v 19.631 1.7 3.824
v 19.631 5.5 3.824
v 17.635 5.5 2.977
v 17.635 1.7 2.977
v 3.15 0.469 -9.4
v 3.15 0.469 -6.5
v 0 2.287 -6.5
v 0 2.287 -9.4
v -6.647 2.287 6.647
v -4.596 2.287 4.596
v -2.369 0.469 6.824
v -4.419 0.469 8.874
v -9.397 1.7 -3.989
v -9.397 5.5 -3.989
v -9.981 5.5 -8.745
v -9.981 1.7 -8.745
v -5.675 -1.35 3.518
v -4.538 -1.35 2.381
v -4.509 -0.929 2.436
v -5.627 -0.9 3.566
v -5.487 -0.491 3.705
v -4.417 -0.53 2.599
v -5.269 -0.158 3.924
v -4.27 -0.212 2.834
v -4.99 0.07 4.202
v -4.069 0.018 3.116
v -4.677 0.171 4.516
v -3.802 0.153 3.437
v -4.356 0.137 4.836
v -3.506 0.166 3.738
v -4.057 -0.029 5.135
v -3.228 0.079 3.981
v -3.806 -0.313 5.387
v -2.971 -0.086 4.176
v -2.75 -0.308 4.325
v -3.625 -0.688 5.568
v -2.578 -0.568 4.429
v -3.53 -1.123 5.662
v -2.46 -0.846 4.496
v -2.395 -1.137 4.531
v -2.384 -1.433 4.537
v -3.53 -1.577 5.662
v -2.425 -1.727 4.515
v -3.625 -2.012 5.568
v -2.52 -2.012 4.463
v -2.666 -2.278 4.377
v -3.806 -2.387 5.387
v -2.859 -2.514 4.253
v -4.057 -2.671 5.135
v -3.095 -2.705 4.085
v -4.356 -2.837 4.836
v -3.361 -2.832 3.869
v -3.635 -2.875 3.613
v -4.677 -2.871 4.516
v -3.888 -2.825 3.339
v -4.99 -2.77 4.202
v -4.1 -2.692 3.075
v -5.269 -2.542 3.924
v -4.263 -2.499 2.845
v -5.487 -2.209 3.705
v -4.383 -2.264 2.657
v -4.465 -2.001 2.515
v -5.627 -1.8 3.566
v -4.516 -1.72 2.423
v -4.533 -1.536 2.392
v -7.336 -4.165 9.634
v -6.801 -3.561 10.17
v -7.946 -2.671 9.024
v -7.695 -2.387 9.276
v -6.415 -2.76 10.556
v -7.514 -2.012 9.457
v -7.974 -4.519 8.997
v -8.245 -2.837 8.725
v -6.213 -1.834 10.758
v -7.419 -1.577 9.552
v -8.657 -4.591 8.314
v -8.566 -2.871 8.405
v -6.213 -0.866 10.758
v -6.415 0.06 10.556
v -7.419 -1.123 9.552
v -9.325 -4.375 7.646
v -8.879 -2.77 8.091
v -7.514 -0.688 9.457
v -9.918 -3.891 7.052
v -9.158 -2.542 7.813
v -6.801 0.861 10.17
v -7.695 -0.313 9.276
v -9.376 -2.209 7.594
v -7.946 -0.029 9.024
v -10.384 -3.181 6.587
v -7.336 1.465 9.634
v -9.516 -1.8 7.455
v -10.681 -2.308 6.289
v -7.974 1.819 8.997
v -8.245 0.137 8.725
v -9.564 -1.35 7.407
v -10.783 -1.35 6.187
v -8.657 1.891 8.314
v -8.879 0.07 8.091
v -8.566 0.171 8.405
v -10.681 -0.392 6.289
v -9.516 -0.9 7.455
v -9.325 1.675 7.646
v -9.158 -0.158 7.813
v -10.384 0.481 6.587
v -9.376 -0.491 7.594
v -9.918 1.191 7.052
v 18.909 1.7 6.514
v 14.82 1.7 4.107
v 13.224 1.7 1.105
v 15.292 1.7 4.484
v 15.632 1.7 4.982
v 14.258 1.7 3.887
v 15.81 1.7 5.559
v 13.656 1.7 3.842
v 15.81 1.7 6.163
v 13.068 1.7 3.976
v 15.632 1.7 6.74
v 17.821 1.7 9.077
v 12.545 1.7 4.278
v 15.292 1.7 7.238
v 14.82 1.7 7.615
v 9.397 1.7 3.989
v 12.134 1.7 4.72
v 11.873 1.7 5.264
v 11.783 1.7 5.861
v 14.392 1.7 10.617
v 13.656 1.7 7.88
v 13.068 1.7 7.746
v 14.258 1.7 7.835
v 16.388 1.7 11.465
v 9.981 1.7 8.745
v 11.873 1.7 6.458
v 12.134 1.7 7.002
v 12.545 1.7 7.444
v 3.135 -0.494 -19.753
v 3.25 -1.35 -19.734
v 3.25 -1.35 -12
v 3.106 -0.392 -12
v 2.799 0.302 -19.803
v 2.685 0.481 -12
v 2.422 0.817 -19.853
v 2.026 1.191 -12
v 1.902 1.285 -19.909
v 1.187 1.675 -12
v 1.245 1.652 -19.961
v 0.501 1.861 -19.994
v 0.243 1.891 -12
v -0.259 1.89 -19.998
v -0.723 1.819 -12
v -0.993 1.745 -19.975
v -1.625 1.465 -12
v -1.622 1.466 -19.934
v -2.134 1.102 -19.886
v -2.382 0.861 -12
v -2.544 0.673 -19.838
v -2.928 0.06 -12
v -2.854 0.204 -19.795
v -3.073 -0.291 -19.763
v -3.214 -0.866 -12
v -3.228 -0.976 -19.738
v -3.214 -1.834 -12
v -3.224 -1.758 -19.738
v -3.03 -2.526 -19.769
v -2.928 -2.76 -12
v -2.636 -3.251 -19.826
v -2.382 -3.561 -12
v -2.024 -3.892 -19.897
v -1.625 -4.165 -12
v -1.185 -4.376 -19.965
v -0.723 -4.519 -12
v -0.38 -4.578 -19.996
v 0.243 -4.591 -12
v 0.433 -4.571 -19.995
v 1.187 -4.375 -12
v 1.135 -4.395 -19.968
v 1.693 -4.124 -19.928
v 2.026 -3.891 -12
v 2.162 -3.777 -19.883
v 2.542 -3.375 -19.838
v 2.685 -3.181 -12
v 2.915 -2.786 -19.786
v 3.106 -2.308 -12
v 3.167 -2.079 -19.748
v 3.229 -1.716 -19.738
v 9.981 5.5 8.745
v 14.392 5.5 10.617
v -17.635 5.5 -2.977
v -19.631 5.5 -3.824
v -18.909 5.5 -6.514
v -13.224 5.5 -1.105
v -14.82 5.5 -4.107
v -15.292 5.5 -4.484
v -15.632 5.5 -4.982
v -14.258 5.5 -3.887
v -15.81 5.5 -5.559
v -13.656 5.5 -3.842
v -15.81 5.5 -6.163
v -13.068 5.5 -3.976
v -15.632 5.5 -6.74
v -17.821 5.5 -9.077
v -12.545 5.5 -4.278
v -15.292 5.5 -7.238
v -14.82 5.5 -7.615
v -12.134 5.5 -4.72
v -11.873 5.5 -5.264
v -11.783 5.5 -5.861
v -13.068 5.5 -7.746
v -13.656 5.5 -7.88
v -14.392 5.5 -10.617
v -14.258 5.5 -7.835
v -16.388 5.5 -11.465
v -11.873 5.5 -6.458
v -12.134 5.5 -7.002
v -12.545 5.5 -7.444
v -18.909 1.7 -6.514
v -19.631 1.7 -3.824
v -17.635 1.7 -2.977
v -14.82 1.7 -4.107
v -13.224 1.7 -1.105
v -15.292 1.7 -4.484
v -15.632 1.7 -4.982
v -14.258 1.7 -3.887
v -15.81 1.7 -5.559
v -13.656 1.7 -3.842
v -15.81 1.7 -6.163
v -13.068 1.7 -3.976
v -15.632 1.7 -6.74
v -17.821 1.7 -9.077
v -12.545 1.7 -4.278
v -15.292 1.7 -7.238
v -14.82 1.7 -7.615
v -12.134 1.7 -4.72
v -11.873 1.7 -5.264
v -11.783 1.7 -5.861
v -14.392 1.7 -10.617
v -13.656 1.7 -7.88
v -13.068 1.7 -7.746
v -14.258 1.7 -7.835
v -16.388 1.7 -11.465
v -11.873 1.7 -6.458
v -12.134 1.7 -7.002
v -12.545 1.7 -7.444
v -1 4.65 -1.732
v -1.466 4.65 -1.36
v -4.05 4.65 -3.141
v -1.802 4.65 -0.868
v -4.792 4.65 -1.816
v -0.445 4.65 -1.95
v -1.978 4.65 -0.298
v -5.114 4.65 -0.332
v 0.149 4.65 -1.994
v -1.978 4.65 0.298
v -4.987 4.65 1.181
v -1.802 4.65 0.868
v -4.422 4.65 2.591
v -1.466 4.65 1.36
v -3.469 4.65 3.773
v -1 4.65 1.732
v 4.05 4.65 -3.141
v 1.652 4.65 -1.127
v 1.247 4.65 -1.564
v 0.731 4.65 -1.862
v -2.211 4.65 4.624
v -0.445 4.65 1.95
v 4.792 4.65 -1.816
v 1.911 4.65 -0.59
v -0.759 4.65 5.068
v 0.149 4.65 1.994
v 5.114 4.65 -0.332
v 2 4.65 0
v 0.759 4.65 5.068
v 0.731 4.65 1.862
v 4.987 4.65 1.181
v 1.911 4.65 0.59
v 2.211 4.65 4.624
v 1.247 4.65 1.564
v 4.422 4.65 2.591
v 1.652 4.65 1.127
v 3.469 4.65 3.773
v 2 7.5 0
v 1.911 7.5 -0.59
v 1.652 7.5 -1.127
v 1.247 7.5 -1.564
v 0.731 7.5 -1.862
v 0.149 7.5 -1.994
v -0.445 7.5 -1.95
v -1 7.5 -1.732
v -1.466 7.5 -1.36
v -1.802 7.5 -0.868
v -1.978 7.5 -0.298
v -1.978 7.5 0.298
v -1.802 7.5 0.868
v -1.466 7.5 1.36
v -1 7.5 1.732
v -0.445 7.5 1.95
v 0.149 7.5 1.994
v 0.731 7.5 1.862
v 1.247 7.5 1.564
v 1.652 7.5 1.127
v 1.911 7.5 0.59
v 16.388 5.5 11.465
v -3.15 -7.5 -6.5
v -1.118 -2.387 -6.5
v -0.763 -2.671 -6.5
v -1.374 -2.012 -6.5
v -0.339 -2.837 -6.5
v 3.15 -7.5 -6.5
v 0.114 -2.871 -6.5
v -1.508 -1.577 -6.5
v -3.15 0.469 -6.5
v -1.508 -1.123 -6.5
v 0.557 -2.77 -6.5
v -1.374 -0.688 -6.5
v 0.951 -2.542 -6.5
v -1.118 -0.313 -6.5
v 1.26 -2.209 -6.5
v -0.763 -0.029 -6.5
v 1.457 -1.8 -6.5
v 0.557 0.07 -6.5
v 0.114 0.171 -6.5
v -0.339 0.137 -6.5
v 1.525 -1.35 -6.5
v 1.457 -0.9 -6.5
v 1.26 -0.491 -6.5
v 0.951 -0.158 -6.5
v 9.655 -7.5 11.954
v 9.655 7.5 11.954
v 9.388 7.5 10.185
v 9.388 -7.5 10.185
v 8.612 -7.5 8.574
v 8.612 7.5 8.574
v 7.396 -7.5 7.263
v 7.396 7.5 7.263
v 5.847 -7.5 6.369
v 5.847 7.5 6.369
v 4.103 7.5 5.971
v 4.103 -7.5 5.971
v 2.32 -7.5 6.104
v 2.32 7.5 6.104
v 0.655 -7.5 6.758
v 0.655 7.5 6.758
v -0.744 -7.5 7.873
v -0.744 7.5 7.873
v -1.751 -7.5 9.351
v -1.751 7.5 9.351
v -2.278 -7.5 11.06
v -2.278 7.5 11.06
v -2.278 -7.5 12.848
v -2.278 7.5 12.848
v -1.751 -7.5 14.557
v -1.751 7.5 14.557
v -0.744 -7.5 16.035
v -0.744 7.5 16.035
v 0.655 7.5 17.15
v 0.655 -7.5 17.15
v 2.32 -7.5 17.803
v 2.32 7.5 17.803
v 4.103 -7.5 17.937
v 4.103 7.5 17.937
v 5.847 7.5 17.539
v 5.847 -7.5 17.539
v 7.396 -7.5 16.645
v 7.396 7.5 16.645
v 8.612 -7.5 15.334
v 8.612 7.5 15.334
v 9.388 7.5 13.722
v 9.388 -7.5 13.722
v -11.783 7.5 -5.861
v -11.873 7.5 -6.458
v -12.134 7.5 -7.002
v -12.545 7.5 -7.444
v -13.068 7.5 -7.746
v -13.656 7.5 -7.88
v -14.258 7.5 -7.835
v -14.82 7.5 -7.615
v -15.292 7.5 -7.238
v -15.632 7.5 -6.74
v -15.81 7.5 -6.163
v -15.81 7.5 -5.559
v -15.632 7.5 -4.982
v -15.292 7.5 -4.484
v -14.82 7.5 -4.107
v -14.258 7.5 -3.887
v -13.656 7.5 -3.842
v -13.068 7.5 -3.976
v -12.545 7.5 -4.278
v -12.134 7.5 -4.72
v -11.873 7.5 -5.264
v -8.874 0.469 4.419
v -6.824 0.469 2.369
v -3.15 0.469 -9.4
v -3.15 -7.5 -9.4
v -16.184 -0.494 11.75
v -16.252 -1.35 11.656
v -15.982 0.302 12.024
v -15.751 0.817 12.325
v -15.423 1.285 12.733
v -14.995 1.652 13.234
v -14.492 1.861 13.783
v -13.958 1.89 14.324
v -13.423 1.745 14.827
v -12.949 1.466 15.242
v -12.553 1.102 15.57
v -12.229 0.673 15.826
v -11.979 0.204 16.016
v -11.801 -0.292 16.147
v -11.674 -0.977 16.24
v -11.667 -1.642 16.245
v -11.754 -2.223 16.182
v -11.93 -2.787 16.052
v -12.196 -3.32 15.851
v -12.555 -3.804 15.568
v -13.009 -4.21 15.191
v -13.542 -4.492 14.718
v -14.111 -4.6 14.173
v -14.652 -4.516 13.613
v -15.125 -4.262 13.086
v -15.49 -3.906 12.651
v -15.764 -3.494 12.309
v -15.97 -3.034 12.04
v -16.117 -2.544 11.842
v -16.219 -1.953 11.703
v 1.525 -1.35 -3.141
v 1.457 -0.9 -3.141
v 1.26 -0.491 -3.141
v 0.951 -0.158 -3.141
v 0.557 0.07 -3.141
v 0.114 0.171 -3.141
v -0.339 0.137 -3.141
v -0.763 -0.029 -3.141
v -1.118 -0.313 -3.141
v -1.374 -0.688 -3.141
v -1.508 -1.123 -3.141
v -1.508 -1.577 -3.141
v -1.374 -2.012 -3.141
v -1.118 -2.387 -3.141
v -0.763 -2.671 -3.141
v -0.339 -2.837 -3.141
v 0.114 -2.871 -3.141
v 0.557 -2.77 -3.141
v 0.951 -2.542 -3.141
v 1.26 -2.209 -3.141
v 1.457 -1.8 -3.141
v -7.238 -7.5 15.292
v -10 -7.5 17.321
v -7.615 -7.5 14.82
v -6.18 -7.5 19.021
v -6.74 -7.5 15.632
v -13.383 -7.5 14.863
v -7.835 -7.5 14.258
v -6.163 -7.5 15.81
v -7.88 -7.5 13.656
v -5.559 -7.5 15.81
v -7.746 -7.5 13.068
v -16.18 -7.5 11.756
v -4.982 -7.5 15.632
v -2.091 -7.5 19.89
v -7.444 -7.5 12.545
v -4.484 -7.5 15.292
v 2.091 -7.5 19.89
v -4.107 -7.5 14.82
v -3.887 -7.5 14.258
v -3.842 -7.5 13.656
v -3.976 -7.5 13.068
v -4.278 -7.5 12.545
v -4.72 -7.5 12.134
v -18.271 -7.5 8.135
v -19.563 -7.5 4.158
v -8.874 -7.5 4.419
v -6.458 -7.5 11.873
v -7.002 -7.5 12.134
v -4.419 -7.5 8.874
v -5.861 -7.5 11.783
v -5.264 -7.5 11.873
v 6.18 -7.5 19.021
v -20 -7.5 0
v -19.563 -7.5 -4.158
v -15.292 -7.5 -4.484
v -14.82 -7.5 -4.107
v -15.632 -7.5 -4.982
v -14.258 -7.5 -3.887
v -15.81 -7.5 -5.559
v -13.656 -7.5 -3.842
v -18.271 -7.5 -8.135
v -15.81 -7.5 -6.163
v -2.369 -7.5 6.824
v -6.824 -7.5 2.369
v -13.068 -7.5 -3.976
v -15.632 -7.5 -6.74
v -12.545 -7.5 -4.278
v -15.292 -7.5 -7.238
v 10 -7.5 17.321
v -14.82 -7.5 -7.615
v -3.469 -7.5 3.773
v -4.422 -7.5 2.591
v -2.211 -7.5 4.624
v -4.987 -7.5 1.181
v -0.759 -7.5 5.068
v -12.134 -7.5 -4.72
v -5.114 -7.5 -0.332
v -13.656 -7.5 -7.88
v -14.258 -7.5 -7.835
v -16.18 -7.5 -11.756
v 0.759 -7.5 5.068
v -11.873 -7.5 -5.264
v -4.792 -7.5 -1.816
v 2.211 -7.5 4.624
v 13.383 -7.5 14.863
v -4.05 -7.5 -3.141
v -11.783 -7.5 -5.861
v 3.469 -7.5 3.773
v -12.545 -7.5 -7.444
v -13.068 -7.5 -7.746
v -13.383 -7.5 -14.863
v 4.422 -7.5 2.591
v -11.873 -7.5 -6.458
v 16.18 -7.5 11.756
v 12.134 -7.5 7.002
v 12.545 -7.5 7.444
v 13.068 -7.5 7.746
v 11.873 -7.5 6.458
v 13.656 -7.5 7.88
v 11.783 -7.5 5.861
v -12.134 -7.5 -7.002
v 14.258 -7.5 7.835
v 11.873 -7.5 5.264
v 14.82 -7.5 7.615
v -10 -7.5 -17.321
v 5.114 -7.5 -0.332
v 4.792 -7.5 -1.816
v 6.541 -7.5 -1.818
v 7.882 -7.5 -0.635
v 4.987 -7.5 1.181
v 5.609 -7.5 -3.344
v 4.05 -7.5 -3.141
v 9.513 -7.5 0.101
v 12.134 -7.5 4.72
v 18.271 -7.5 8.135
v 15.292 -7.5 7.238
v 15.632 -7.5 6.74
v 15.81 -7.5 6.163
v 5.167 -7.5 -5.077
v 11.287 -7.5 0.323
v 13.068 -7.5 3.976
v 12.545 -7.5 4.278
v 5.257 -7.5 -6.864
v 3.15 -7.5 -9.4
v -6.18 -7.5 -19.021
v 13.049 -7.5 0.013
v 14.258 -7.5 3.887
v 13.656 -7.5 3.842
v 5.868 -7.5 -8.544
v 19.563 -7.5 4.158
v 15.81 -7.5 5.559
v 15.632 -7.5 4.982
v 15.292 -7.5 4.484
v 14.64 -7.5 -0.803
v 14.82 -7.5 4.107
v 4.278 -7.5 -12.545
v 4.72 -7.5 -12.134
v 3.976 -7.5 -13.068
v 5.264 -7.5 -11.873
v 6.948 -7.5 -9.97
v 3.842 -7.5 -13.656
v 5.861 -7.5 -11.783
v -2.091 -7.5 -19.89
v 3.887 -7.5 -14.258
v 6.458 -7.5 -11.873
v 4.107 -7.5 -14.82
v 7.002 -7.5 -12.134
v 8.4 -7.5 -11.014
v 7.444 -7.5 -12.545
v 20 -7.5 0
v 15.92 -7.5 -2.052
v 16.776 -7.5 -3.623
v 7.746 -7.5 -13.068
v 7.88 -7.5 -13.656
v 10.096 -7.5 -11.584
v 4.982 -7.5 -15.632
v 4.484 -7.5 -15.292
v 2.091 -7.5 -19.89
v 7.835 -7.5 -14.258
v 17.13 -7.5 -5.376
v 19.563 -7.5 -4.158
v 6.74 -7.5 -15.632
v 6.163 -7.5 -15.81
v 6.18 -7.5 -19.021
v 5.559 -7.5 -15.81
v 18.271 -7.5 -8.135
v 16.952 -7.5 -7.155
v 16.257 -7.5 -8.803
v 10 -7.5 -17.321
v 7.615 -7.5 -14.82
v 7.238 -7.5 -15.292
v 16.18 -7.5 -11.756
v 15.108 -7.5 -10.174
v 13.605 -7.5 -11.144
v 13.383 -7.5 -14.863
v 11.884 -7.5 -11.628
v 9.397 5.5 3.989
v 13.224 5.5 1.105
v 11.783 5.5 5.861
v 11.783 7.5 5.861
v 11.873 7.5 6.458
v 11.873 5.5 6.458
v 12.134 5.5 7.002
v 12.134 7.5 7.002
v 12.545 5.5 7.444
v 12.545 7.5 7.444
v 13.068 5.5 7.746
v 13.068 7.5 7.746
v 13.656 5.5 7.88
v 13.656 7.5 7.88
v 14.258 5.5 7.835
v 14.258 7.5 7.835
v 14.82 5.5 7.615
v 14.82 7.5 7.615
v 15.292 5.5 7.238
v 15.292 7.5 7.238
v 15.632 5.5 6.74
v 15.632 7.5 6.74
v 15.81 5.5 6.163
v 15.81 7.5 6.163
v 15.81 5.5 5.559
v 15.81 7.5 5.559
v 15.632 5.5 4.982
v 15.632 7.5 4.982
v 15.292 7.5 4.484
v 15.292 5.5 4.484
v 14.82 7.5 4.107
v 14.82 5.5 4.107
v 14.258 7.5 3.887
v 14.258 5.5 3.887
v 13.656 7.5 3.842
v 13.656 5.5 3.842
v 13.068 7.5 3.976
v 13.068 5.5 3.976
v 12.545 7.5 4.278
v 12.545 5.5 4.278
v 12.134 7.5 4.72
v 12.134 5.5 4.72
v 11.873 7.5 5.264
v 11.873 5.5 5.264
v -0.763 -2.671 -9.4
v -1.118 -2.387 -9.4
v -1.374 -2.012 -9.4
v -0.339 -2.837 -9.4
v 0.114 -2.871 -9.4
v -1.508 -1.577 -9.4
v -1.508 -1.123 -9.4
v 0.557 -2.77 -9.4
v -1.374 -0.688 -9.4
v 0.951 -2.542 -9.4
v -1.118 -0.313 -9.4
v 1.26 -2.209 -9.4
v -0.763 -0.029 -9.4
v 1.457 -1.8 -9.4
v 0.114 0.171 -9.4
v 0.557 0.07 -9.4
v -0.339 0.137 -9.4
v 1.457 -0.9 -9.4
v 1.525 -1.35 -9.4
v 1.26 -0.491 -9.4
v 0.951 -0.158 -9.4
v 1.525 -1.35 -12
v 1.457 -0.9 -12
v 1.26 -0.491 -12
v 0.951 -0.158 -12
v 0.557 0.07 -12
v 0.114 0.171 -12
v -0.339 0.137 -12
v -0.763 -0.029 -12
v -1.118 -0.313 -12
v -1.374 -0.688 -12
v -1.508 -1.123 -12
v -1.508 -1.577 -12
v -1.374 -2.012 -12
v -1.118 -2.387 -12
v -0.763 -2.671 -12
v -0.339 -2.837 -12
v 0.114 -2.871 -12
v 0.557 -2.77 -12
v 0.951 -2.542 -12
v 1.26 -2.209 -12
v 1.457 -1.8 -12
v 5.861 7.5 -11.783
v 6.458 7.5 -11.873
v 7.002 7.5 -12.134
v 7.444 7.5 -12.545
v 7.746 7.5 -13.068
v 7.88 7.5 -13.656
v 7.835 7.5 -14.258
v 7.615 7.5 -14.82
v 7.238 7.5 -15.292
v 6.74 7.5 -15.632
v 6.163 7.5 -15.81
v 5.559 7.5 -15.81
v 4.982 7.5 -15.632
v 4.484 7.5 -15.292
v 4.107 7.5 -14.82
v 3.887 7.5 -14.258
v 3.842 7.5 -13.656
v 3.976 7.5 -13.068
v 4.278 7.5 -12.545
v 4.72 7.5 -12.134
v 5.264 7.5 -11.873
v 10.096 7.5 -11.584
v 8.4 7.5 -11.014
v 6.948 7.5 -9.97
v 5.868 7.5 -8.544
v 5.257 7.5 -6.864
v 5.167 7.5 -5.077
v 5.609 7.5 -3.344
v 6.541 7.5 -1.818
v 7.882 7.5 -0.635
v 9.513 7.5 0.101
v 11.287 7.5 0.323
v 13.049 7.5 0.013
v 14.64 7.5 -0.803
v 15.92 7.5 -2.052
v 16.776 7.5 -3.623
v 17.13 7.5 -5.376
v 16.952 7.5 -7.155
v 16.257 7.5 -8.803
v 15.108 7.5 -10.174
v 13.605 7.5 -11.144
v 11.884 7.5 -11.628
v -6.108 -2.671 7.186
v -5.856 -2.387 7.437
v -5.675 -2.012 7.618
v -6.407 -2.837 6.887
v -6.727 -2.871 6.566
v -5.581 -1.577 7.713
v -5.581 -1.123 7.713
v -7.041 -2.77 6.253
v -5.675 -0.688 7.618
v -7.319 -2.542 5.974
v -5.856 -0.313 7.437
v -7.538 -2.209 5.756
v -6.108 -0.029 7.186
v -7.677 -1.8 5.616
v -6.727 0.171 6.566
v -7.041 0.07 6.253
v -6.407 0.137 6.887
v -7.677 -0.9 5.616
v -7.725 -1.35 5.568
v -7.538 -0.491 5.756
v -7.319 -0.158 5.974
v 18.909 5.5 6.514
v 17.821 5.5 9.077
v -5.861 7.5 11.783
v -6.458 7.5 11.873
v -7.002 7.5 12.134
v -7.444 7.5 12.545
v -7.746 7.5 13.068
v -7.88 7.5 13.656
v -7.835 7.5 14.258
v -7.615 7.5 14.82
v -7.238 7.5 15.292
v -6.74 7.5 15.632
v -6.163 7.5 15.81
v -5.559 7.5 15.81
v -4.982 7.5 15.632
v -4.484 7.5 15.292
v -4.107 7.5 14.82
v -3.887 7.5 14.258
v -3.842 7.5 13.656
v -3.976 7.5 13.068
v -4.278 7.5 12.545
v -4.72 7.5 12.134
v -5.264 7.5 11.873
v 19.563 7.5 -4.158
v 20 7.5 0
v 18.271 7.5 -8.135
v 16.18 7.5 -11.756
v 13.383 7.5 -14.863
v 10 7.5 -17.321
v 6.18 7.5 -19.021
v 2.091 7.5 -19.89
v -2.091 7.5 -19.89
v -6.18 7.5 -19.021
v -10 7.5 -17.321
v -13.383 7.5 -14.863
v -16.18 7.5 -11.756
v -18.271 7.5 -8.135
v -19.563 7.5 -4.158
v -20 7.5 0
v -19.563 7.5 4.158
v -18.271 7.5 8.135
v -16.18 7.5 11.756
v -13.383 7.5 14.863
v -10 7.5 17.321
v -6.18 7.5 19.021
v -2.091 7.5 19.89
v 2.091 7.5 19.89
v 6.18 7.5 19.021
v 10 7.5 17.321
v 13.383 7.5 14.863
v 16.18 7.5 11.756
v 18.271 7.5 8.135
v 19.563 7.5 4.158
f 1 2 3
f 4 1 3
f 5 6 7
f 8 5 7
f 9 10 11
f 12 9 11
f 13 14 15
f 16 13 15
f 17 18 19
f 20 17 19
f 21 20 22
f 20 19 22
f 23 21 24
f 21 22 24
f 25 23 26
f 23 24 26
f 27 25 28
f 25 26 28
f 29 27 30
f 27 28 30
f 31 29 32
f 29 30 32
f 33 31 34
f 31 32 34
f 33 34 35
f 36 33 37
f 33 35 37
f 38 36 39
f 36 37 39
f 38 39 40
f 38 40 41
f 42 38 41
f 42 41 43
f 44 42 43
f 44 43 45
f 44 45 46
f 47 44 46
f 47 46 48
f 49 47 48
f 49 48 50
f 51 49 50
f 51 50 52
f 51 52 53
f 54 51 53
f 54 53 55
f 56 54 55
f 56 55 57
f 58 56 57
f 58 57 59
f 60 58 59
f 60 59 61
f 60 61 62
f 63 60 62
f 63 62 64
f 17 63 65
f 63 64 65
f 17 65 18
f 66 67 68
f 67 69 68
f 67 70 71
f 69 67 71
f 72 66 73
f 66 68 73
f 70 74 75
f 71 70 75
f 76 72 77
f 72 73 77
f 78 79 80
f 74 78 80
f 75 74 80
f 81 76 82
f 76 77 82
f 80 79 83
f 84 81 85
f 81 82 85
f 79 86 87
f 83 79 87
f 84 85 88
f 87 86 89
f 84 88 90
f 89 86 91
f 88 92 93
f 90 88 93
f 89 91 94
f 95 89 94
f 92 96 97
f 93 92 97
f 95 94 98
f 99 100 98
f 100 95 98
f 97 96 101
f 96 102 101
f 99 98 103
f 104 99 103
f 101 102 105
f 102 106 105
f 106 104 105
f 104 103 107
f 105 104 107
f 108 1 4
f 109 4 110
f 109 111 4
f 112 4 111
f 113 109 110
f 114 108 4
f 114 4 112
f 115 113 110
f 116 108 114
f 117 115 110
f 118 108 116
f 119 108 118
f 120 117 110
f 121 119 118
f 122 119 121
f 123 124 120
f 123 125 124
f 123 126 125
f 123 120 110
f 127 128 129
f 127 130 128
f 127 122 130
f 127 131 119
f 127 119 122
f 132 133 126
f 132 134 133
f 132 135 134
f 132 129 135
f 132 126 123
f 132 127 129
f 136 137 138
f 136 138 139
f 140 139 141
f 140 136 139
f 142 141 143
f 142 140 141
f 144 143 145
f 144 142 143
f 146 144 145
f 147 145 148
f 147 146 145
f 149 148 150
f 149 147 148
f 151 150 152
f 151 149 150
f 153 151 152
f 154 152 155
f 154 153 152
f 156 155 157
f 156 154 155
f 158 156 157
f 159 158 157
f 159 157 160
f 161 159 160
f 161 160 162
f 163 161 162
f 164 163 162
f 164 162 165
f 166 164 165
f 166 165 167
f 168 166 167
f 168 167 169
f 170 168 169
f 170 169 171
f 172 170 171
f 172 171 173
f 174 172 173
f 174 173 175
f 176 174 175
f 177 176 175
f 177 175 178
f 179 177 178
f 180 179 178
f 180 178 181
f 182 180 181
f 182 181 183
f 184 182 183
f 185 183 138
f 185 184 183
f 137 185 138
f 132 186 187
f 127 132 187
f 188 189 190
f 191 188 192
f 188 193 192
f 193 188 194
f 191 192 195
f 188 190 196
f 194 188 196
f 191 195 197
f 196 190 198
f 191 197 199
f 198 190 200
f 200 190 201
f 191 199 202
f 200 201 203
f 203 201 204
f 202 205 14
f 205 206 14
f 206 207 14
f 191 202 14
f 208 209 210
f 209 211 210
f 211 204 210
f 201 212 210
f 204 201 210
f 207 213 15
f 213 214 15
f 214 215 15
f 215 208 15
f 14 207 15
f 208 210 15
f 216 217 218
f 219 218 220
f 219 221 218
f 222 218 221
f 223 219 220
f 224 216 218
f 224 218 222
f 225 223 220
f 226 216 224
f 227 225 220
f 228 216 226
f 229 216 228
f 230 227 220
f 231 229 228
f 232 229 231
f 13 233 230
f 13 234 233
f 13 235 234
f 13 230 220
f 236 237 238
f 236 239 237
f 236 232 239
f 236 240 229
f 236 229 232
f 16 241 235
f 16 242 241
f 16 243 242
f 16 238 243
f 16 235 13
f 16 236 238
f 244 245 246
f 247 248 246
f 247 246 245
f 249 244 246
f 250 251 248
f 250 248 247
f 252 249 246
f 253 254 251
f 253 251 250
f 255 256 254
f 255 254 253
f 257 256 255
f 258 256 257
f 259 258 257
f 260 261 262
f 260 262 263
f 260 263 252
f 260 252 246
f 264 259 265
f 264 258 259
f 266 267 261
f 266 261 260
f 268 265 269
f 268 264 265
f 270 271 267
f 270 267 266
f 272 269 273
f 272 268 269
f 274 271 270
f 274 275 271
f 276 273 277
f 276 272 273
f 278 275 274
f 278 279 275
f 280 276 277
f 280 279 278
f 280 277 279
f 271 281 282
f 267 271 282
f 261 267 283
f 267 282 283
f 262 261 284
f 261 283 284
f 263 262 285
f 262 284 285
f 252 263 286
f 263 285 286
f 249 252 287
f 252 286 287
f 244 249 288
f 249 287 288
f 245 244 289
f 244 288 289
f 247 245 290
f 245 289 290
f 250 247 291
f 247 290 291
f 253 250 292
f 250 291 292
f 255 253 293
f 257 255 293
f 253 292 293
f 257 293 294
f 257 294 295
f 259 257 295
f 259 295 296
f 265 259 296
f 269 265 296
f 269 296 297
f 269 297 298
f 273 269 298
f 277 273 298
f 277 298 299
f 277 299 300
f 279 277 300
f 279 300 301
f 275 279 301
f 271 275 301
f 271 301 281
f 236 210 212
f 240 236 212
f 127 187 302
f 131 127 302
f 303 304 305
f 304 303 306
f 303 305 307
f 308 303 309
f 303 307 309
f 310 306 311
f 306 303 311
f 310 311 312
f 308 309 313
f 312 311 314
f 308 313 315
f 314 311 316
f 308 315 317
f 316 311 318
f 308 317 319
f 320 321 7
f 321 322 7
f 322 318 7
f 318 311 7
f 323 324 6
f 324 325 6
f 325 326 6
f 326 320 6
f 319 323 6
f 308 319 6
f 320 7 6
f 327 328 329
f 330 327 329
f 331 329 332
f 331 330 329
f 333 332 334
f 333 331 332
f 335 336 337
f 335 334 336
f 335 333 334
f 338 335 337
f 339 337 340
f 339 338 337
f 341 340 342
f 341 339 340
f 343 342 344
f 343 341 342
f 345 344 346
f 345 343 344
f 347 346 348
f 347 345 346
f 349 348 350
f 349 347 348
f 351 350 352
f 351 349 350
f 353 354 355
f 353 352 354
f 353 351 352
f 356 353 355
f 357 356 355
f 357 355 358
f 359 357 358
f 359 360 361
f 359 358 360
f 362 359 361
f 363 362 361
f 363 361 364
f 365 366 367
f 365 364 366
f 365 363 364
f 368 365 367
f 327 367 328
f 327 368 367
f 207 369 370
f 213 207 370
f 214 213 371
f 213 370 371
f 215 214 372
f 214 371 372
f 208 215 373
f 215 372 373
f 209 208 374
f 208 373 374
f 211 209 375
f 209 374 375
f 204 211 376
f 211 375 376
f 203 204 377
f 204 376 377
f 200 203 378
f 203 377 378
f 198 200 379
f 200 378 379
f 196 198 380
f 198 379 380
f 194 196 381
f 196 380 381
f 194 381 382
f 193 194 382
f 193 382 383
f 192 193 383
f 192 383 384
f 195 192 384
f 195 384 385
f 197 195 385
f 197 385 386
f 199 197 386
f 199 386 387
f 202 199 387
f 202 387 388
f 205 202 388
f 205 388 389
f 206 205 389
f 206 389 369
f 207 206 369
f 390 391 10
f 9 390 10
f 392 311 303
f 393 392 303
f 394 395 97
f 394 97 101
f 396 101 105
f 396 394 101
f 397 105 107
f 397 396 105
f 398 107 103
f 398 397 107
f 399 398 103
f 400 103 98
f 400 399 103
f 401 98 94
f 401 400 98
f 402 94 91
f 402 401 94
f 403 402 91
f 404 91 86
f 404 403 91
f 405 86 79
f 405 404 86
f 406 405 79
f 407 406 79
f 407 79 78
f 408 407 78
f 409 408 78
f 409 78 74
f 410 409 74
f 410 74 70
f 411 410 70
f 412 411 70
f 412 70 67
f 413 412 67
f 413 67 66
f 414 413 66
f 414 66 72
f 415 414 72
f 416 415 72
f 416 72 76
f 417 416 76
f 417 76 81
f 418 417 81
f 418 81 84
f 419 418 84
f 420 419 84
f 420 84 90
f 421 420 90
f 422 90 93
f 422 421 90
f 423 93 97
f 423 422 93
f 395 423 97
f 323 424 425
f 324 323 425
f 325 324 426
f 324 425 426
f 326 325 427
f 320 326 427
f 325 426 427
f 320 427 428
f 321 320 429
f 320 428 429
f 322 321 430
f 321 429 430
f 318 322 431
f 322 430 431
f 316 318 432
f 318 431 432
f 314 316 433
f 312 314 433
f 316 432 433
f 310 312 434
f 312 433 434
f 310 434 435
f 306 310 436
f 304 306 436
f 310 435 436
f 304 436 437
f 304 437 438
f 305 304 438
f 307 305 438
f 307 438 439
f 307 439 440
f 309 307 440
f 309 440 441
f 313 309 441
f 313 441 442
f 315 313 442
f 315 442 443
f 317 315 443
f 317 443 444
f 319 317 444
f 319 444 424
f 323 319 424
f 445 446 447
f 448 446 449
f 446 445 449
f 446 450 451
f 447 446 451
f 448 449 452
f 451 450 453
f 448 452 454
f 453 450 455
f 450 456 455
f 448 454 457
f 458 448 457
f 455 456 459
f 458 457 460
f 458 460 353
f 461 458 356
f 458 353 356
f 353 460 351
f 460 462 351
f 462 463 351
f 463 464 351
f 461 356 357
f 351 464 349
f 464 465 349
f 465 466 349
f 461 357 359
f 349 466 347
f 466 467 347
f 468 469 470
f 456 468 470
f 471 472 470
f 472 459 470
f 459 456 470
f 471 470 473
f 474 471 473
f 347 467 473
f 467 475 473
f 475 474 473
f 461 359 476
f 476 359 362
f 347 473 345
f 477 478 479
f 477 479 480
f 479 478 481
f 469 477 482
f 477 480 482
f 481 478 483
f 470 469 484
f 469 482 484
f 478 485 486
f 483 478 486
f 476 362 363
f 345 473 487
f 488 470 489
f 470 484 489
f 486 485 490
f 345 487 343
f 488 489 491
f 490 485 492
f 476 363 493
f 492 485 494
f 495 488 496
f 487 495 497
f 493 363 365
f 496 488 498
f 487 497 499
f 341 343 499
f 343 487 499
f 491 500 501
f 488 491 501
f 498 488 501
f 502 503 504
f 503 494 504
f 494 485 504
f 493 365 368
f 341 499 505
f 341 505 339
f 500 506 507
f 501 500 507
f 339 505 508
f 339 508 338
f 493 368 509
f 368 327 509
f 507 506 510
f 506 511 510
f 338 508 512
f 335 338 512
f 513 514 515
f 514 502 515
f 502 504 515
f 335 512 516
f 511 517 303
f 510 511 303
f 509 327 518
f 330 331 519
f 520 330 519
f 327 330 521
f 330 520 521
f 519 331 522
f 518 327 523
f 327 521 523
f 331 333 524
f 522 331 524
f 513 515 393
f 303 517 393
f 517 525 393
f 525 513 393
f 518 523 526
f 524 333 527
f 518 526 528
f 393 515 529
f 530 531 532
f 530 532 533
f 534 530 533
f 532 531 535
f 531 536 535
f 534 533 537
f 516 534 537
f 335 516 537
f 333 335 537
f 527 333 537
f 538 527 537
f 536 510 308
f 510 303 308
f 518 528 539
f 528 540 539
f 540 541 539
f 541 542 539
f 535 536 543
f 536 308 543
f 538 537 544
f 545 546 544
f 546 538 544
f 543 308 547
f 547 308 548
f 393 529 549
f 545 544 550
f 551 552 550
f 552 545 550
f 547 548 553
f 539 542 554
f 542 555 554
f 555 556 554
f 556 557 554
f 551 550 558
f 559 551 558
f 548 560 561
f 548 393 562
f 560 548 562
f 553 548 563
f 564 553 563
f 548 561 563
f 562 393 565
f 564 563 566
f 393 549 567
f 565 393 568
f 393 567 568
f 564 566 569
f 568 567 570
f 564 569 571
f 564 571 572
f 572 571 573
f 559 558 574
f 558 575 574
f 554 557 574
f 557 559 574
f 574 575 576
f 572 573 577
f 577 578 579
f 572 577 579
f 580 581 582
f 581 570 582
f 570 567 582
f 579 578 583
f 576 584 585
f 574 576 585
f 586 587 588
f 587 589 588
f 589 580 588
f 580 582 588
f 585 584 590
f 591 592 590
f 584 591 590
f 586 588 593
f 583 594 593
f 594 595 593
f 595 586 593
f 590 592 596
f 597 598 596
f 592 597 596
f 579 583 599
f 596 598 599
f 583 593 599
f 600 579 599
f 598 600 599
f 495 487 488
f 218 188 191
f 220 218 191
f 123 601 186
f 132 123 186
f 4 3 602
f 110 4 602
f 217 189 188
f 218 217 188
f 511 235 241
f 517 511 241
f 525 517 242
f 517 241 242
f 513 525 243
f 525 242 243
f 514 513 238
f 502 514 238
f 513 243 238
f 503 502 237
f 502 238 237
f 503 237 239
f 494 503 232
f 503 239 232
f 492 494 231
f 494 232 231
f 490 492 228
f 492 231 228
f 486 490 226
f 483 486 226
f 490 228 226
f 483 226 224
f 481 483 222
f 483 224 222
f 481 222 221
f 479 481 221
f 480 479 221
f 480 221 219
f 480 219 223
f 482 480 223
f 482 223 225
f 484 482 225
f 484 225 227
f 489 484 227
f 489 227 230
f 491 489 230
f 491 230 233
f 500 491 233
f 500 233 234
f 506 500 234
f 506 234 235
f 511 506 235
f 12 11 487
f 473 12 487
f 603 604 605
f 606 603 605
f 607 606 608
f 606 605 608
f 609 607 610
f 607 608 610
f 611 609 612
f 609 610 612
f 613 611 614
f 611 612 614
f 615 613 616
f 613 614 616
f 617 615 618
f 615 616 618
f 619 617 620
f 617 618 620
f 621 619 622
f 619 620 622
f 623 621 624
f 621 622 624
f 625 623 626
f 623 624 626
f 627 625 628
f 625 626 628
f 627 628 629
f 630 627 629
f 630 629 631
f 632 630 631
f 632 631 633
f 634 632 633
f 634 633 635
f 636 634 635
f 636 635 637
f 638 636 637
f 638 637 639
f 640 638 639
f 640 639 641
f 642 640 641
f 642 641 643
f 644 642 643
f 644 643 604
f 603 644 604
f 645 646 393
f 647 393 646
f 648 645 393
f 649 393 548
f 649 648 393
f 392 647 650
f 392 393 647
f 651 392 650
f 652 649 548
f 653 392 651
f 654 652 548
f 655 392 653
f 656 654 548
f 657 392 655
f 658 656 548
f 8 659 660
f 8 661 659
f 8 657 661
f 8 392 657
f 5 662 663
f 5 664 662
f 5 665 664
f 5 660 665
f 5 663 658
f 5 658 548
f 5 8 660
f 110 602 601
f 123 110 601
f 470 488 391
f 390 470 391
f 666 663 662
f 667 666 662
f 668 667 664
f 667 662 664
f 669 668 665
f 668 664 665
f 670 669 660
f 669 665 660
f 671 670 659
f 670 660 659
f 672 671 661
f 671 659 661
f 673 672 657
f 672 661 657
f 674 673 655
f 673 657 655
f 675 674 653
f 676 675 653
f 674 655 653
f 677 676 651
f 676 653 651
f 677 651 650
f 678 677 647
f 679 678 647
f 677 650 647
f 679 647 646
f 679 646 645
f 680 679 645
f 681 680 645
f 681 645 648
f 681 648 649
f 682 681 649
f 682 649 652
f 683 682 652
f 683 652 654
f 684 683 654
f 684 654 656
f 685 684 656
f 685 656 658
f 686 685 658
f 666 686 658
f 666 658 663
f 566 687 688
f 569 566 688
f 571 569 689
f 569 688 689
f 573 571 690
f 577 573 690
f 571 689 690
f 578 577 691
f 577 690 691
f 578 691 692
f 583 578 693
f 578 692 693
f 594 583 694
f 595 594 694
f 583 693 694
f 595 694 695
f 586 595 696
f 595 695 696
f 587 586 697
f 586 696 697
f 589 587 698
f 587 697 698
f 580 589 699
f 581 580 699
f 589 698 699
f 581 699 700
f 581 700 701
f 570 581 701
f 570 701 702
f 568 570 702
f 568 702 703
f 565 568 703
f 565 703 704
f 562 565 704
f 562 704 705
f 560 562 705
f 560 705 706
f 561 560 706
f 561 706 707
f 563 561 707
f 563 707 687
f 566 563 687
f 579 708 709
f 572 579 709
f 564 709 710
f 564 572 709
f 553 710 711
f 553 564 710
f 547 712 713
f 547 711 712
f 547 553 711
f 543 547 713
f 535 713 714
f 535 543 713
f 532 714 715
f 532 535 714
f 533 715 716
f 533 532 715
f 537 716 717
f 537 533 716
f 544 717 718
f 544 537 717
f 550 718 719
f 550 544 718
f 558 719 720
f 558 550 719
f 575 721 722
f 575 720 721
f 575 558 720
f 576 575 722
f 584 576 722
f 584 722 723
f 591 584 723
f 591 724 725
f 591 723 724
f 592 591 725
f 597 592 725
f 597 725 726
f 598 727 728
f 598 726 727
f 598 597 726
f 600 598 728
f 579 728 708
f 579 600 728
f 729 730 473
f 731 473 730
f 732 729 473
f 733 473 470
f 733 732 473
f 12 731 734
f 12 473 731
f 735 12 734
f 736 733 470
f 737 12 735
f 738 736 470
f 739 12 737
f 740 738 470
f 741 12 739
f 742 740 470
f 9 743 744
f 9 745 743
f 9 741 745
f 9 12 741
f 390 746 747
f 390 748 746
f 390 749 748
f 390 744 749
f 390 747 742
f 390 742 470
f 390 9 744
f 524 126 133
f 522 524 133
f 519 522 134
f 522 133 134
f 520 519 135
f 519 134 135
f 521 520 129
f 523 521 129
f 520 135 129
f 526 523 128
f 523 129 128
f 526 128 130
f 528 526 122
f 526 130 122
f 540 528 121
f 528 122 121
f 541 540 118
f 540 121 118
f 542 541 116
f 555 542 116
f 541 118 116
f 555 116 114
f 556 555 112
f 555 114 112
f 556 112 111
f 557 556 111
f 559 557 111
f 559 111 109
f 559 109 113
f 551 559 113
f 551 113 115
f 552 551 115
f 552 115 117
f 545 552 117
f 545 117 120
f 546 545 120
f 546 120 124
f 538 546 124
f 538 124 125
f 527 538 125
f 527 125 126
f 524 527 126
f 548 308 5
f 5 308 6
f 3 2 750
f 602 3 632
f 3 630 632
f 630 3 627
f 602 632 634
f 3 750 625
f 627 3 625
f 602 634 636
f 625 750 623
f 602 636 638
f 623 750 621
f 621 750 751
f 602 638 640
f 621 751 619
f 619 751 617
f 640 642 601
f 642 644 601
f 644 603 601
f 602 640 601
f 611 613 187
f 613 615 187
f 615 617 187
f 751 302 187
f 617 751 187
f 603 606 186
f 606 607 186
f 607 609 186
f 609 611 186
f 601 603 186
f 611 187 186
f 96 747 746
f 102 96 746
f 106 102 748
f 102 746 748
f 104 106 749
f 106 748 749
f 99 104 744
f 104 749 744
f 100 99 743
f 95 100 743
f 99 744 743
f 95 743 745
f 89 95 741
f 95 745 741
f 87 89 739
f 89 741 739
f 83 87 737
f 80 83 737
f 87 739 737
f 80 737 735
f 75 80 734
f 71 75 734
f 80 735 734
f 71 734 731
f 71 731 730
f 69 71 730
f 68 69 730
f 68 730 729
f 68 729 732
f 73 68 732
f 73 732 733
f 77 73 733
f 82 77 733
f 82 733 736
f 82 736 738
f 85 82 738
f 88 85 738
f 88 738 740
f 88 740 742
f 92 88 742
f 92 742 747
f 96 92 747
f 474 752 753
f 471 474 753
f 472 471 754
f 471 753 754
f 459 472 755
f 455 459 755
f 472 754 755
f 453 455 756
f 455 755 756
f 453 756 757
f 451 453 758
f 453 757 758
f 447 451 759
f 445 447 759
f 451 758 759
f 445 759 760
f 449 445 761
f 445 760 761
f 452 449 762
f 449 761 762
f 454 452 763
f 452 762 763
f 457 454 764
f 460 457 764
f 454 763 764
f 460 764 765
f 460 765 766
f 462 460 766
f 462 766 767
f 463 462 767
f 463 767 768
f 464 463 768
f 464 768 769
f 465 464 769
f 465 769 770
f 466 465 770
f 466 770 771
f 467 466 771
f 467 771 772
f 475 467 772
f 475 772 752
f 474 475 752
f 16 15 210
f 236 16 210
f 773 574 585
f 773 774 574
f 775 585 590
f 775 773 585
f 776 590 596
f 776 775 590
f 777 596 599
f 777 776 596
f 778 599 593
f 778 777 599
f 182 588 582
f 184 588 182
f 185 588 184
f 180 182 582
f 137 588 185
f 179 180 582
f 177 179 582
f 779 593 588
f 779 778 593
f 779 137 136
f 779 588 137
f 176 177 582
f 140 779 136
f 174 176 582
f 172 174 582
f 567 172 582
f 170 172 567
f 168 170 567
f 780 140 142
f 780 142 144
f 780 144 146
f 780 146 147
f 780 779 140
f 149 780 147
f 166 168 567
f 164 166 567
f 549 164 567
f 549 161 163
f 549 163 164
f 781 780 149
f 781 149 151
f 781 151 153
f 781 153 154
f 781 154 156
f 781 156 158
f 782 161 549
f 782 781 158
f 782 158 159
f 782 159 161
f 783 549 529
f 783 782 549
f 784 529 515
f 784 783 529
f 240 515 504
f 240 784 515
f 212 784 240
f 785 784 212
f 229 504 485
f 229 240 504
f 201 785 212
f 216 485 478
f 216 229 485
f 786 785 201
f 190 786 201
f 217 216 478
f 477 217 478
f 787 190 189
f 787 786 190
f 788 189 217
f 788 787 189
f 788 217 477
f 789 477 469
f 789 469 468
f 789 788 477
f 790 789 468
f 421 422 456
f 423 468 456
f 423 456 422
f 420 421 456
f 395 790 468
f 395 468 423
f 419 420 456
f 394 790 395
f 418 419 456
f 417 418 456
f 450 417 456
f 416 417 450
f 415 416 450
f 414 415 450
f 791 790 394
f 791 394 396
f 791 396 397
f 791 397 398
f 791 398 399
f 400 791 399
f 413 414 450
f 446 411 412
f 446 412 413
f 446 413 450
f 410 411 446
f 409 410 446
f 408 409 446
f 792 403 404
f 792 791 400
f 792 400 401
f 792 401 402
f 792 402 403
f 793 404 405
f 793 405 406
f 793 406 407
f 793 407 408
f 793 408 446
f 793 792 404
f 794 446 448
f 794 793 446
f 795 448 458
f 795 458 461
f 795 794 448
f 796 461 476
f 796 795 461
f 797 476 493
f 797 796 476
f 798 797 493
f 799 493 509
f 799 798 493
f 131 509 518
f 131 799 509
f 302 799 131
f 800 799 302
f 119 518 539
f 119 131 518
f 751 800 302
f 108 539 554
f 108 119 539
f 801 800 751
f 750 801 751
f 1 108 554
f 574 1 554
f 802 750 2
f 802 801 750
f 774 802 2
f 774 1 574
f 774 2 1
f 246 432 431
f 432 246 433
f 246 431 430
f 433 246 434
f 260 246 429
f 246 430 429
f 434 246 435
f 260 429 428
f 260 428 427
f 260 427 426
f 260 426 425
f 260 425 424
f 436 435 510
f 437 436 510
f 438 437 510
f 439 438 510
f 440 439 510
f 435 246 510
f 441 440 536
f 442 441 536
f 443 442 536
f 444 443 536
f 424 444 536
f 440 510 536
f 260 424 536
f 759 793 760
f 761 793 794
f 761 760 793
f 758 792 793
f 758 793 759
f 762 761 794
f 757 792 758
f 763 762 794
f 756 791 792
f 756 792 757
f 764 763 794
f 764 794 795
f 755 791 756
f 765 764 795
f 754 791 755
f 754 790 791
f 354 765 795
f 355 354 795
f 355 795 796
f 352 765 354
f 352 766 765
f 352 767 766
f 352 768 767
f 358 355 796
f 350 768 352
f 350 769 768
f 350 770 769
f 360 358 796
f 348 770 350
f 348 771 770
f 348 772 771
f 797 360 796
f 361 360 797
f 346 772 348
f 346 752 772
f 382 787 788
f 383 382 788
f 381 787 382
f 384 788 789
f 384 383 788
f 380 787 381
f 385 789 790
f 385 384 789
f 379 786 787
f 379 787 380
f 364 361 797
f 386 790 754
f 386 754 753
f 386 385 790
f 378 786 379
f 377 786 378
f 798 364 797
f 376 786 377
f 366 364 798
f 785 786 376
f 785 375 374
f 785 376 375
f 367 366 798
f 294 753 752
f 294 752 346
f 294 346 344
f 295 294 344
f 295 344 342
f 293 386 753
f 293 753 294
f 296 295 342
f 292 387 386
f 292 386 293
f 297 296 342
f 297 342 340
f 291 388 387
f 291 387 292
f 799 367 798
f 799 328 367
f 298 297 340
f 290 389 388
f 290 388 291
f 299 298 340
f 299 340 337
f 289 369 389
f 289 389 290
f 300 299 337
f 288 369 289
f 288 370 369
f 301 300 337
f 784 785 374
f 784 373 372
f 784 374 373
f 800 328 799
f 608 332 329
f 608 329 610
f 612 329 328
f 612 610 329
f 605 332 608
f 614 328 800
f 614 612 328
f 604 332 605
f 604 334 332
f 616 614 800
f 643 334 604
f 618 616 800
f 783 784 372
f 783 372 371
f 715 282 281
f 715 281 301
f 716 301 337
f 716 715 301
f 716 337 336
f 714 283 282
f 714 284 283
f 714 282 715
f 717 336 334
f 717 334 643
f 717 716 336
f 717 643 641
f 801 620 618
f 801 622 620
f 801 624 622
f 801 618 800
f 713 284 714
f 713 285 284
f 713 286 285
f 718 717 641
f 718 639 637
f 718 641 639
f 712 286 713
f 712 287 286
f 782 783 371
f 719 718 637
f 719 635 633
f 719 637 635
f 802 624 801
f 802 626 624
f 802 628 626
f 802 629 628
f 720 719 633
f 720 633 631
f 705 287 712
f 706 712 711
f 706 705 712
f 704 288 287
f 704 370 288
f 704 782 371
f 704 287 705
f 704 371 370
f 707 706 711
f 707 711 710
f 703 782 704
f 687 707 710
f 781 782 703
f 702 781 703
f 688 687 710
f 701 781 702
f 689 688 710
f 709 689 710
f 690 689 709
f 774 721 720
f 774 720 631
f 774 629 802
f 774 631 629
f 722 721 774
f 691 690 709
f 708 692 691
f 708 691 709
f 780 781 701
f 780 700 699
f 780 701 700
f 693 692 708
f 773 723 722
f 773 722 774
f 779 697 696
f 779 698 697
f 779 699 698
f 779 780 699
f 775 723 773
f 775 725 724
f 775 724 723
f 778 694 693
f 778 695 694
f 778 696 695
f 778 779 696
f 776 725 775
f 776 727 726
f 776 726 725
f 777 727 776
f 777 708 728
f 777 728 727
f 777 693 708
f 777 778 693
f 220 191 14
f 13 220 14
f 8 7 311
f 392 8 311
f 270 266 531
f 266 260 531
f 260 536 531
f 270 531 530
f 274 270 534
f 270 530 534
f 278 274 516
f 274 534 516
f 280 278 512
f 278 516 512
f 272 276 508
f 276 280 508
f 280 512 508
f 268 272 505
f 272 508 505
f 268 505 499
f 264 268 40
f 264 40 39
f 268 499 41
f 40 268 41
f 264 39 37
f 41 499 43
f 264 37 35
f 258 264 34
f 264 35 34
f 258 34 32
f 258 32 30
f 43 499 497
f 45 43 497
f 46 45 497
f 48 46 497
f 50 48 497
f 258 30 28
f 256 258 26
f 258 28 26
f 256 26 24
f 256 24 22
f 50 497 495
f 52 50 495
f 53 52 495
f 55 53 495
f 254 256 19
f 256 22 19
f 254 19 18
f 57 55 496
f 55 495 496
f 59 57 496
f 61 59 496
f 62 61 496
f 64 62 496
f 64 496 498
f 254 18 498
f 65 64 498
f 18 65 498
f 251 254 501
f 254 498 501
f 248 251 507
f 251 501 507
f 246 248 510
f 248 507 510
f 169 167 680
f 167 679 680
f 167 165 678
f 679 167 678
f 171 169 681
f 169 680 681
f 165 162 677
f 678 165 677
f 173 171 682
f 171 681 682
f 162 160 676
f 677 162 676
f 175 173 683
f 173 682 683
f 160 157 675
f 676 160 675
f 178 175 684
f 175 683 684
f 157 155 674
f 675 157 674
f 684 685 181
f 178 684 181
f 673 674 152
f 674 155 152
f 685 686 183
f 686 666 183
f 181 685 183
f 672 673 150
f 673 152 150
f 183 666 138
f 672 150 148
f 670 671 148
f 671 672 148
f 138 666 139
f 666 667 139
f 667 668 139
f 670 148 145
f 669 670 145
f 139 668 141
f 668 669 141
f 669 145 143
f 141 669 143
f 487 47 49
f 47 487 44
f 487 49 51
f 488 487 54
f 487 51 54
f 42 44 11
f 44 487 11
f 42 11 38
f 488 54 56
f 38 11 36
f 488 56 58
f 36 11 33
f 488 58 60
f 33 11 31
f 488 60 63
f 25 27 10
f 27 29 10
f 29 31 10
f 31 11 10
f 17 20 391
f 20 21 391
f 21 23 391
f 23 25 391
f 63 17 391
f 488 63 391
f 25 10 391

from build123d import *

# Parameters (mm, degrees)
SKETCH1_R               = 20
BOSS_EXTRUDE1_DEPTH     = 7.5
SKETCH4_R               = 5.125
CUT_EXTRUDE2_DEPTH      = 12.15
SKETCH5_R               = 2
CUT_EXTRUDE3_DEPTH      = 1
CUT_EXTRUDE3_DEPTH_BACK = 16
SKETCH15_W              = 8.1
SKETCH15_H              = 1.984438744
BOSS_EXTRUDE3_DEPTH     = 12.15
SKETCH2_R               = 2.025
CUT_EXTRUDE1_DEPTH      = 16
CIRPATTERN1_COUNT       = 4
SKETCH6_R               = 1.525
CUT_EXTRUDE4_DEPTH      = 21
CUT_EXTRUDE5_START      = -20
SKETCH7_R               = 3.25
CUT_EXTRUDE5_DEPTH      = 8
CUT_EXTRUDE11_START     = -6.5
CUT_EXTRUDE11_DEPTH     = 2.9
CIRPATTERN2_COUNT       = 2
CIRPATTERN2_ANGLE       = 135
CUT_EXTRUDE7_START      = 5.5
CUT_EXTRUDE7_DEPTH      = 3.8
CIRPATTERN3_COUNT       = 2
CUT_EXTRUDE12_START     = -16.0000001
SKETCH10_R              = 6
CUT_EXTRUDE12_DEPTH     = 17.0000002
CIRPATTERN4_COUNT       = 2
CIRPATTERN4_ANGLE       = 100


with BuildPart() as part:
    # Sketch1 → Boss-Extrude1 (new body, symmetric)
    with BuildSketch(Plane(origin=(0, 0, 0), x_dir=(1, 0, 0), z_dir=(0, 1, 0))):
        Circle(SKETCH1_R)
    extrude(amount=BOSS_EXTRUDE1_DEPTH, both=True)

    # Sketch4 → Cut-Extrude2 (cut)
    with BuildSketch(Plane.XZ.offset(7.5)):
        Circle(SKETCH4_R)
    extrude(amount=-CUT_EXTRUDE2_DEPTH, mode=Mode.SUBTRACT)

    # Sketch5 → Cut-Extrude3 (cut, two sides)
    with BuildSketch(Plane(origin=(0, 7.5, 0), x_dir=(1, 0, 0), z_dir=(0, 1, 0))) as cut_extrude3_sk:
        Circle(SKETCH5_R)
    extrude(amount=CUT_EXTRUDE3_DEPTH, mode=Mode.SUBTRACT)
    extrude(cut_extrude3_sk.sketch, amount=-CUT_EXTRUDE3_DEPTH_BACK, mode=Mode.SUBTRACT)

    # Sketch15 → Boss-Extrude3 (add)
    with BuildSketch(Plane.XZ.offset(7.5)):
        with Locations((0, -4.132780628)):
            Rectangle(SKETCH15_W, SKETCH15_H)
    extrude(amount=-BOSS_EXTRUDE3_DEPTH)

    # Sketch2 → Cut-Extrude1 (cut, through all)
    with BuildSketch(Plane(origin=(0, 7.5, 0), x_dir=(1, 0, 0), z_dir=(0, 1, 0))):
        with Locations((-13.807572802, 5.860966927)):
            Circle(SKETCH2_R)
    cut_extrude1 = extrude(amount=-CUT_EXTRUDE1_DEPTH, mode=Mode.SUBTRACT)

    # CirPattern1: Cut-Extrude1 ×4 about axis
    cirpattern1_axis = Axis((0, 0, 0), (0, 1, 0))
    for i in range(1, CIRPATTERN1_COUNT):
        add(cut_extrude1.rotate(cirpattern1_axis, i * 360 / CIRPATTERN1_COUNT), mode=Mode.SUBTRACT)

    # Sketch6 → Cut-Extrude4 (cut, through all)
    with BuildSketch(Plane.XY):
        with Locations((0, -1.35)):
            Circle(SKETCH6_R)
    cut_extrude4 = extrude(amount=-CUT_EXTRUDE4_DEPTH, mode=Mode.SUBTRACT)

    # Sketch7 → Cut-Extrude5 (cut)
    with BuildSketch(Plane.XY.offset(CUT_EXTRUDE5_START)):
        with Locations((0, -1.35)):
            Circle(SKETCH7_R)
    cut_extrude5 = extrude(amount=CUT_EXTRUDE5_DEPTH, mode=Mode.SUBTRACT)

    # Sketch9 → Cut-Extrude11 (cut)
    with BuildSketch(Plane.XY.offset(CUT_EXTRUDE11_START)):
        Polygon((3.15, -3.168653348), (3.15, 0.468653348), (0, 2.287306696), (-3.15, 0.468653348), (-3.15, -3.168653348), (-3.15, -7.685074736), (3.15, -7.685074736), align=None)
    cut_extrude11 = extrude(amount=-CUT_EXTRUDE11_DEPTH, mode=Mode.SUBTRACT)

    # CirPattern2: Cut-Extrude4, Cut-Extrude5, Cut-Extrude11 ×2 about axis
    cirpattern2_axis = Axis((0, 0, 0), (0, 1, 0))
    for i in range(1, CIRPATTERN2_COUNT):
        add(cut_extrude4.rotate(cirpattern2_axis, i * CIRPATTERN2_ANGLE / (CIRPATTERN2_COUNT - 1)), mode=Mode.SUBTRACT)
        add(cut_extrude5.rotate(cirpattern2_axis, i * CIRPATTERN2_ANGLE / (CIRPATTERN2_COUNT - 1)), mode=Mode.SUBTRACT)
        add(cut_extrude11.rotate(cirpattern2_axis, i * CIRPATTERN2_ANGLE / (CIRPATTERN2_COUNT - 1)), mode=Mode.SUBTRACT)

    # Sketch8 → Cut-Extrude7 (cut)
    with BuildSketch(Plane(origin=(0, 0, 0), x_dir=(1, 0, 0), z_dir=(0, 1, 0)).offset(CUT_EXTRUDE7_START)):
        Polygon((-9.396506885, 3.988580533), (-9.98050566, 8.744868872), (-14.391571577, 10.617255266), (-19.569899143, 12.815324908), (-22.81296751, 5.175134625), (-17.634639943, 2.977064983), (-13.223574027, 1.104678588), align=None)
    cut_extrude7 = extrude(amount=-CUT_EXTRUDE7_DEPTH, mode=Mode.SUBTRACT)

    # CirPattern3: Cut-Extrude7 ×2 about axis
    cirpattern3_axis = Axis((0, 0, 0), (0, 1, 0))
    for i in range(1, CIRPATTERN3_COUNT):
        add(cut_extrude7.rotate(cirpattern3_axis, i * 360 / CIRPATTERN3_COUNT), mode=Mode.SUBTRACT)

    # Sketch10 → Cut-Extrude12 (cut)
    with BuildSketch(Plane(origin=(0, 7.5, 0), x_dir=(1, 0, 0), z_dir=(0, 1, 0)).offset(CUT_EXTRUDE12_START)):
        with Locations((3.654646309, -11.95380945)):
            Circle(SKETCH10_R)
    cut_extrude12 = extrude(amount=CUT_EXTRUDE12_DEPTH, mode=Mode.SUBTRACT)

    # CirPattern4: Cut-Extrude12 ×2 about axis
    cirpattern4_axis = Axis((0, 7.5, 0), (0, 1, 0))
    for i in range(1, CIRPATTERN4_COUNT):
        add(cut_extrude12.rotate(cirpattern4_axis, i * CIRPATTERN4_ANGLE / (CIRPATTERN4_COUNT - 1)), mode=Mode.SUBTRACT)


solid = part.part
